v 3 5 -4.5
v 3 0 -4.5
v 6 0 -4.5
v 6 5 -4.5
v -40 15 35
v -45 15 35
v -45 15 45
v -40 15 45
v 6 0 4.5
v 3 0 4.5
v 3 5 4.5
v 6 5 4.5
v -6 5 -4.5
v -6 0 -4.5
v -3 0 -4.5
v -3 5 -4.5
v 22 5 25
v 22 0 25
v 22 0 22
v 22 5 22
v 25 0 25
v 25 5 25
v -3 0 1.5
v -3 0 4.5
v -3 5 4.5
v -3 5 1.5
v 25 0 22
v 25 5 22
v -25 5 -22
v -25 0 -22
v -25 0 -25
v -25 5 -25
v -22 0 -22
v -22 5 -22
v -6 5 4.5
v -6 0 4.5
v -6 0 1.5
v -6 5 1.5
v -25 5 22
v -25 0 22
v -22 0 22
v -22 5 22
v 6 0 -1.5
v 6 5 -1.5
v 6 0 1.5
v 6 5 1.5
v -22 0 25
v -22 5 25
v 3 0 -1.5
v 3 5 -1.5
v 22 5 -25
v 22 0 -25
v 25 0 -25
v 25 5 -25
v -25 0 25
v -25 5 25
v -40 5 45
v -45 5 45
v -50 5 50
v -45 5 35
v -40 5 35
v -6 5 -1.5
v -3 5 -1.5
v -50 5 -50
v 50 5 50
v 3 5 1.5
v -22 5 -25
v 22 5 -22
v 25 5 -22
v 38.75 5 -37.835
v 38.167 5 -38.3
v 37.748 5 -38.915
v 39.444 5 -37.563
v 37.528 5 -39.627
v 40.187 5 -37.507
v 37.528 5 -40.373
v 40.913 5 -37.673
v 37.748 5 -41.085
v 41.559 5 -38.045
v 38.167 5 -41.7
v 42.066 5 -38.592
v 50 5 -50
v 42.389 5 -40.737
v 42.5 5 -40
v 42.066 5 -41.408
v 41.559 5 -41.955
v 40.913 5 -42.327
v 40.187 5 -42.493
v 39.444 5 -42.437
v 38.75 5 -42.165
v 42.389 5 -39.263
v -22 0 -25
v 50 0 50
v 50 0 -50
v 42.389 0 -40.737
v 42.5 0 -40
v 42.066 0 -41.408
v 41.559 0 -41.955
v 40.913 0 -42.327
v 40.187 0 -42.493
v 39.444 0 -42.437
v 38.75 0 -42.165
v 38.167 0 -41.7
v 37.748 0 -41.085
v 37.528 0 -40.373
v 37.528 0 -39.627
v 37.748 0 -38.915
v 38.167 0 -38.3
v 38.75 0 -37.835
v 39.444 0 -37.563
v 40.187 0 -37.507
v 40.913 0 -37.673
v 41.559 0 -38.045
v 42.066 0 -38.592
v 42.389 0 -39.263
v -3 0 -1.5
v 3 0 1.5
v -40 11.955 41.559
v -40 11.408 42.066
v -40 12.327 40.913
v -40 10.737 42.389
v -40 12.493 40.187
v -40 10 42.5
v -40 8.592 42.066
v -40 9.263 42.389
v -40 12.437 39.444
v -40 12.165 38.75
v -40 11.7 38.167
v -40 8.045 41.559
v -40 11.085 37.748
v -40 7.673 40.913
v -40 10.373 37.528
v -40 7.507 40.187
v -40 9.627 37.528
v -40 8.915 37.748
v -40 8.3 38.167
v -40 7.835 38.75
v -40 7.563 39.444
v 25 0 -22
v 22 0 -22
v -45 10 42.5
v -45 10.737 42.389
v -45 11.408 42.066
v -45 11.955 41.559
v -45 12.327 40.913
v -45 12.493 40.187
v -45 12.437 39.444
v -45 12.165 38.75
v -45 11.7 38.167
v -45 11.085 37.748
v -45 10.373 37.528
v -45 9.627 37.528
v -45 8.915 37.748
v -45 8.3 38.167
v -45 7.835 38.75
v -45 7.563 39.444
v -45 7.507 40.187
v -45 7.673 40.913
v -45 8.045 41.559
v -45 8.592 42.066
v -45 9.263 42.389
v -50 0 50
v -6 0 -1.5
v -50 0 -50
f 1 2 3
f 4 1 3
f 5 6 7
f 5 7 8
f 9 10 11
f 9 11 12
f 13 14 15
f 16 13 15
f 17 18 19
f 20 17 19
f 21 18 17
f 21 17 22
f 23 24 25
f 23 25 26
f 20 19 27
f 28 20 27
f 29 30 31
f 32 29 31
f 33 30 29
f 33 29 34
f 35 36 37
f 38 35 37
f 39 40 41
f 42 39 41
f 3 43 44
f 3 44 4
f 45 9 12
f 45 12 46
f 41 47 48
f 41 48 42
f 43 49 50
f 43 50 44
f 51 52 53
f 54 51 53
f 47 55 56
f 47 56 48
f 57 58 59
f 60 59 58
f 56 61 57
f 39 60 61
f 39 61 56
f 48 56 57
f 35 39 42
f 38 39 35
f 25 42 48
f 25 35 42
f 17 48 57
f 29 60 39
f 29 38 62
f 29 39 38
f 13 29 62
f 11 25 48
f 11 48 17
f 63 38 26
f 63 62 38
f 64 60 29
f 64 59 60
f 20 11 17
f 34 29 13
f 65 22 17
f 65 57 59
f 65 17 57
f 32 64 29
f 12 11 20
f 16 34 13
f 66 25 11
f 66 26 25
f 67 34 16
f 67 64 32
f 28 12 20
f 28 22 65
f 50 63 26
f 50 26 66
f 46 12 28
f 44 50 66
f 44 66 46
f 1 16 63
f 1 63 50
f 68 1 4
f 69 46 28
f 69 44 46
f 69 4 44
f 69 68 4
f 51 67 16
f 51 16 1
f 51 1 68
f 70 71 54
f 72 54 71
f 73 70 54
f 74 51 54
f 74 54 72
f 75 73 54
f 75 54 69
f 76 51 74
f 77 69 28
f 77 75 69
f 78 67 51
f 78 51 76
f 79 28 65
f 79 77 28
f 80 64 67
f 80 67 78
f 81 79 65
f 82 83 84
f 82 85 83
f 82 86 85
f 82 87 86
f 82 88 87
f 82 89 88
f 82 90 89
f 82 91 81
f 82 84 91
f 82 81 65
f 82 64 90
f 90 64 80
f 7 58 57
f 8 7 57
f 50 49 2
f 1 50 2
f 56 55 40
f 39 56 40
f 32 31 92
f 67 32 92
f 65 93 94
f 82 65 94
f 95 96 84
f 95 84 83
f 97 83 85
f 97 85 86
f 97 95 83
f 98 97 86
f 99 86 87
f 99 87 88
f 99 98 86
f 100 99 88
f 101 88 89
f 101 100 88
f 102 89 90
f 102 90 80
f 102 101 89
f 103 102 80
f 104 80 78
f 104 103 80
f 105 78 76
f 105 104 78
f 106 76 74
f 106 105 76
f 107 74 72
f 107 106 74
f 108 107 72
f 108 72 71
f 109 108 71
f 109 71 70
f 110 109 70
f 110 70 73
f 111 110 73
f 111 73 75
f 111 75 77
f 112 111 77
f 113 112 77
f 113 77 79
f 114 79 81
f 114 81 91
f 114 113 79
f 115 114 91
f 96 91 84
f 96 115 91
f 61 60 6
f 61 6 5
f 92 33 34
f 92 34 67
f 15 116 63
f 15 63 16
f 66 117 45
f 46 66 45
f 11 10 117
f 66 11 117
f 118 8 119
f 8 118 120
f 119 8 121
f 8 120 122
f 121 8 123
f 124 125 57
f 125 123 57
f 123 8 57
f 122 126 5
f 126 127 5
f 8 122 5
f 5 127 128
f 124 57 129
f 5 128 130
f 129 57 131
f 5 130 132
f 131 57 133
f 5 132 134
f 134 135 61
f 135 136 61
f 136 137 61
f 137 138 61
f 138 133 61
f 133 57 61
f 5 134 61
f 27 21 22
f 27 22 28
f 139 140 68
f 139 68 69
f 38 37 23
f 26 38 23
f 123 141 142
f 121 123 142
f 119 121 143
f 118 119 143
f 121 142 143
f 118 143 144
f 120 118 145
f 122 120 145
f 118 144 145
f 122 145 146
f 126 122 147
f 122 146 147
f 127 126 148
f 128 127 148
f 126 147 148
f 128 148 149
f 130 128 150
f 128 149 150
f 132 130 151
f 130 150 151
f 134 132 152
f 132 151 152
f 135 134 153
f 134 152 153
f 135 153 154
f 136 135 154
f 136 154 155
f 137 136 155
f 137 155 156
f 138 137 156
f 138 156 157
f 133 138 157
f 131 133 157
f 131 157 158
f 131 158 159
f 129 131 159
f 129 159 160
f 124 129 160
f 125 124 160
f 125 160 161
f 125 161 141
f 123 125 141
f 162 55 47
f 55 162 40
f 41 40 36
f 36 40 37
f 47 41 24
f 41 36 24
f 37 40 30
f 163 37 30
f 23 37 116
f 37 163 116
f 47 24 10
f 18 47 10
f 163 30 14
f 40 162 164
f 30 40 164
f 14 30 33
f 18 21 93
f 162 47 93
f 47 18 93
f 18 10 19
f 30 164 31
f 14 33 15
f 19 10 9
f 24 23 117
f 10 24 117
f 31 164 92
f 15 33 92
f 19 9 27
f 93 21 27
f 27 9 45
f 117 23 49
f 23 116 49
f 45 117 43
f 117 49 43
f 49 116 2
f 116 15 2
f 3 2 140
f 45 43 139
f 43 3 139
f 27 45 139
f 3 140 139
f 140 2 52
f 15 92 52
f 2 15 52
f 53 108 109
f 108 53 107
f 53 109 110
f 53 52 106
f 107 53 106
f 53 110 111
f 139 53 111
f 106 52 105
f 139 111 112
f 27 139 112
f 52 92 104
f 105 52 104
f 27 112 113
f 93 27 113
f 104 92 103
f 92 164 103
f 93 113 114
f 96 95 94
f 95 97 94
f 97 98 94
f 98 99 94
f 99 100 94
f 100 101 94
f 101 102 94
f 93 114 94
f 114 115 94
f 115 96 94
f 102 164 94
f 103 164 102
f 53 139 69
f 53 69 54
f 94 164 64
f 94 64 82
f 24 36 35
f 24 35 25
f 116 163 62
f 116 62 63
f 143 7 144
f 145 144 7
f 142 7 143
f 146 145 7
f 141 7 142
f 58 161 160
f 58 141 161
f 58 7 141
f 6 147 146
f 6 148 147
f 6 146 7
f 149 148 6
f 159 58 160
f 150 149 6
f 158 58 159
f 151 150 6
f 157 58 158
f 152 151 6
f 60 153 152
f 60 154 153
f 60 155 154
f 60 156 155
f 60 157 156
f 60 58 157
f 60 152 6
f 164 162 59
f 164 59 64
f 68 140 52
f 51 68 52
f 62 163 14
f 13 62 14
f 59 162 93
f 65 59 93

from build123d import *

# Parameters (mm, degrees)
SKETCH1_W           = 100
SKETCH1_H           = 100
SKETCH1_R           = 2.5
SKETCH1_W_2         = 3
SKETCH1_H_2         = 3
BOSS_EXTRUDE1_DEPTH = 5
SKETCH4_W           = 5
SKETCH4_H           = 10
BOSS_EXTRUDE2_DEPTH = 10
SKETCH5_R           = 2.5
CUT_EXTRUDE1_DEPTH  = 15


with BuildPart() as part:
    # Sketch1 → Boss-Extrude1 (new body)
    with BuildSketch(Plane(origin=(0, 0, 0), x_dir=(1, 0, 0), z_dir=(0, 1, 0))):
        Rectangle(SKETCH1_W, SKETCH1_H)
        with Locations((40, 40)):
            Circle(SKETCH1_R, mode=Mode.SUBTRACT)
        with Locations((-23.5, 23.5)):
            Rectangle(SKETCH1_W_2, SKETCH1_H_2, mode=Mode.SUBTRACT)
        with Locations((23.5, 23.5)):
            Rectangle(SKETCH1_W_2, SKETCH1_H_2, mode=Mode.SUBTRACT)
        with Locations((23.5, -23.5)):
            Rectangle(SKETCH1_W_2, SKETCH1_H_2, mode=Mode.SUBTRACT)
        with Locations((-23.5, -23.5)):
            Rectangle(SKETCH1_W_2, SKETCH1_H_2, mode=Mode.SUBTRACT)
        with Locations((4.5, 3)):
            Rectangle(SKETCH1_W_2, SKETCH1_H_2, mode=Mode.SUBTRACT)
        with Locations((-4.5, 3)):
            Rectangle(SKETCH1_W_2, SKETCH1_H_2, mode=Mode.SUBTRACT)
        with Locations((4.5, -3)):
            Rectangle(SKETCH1_W_2, SKETCH1_H_2, mode=Mode.SUBTRACT)
        with Locations((-4.5, -3)):
            Rectangle(SKETCH1_W_2, SKETCH1_H_2, mode=Mode.SUBTRACT)
    extrude(amount=BOSS_EXTRUDE1_DEPTH)

    # Sketch4 → Boss-Extrude2 (add)
    with BuildSketch(Plane(origin=(0, 5, 0), x_dir=(1, 0, 0), z_dir=(0, 1, 0))):
        with Locations((-42.5, -40)):
            Rectangle(SKETCH4_W, SKETCH4_H)
    extrude(amount=BOSS_EXTRUDE2_DEPTH)

    # Sketch5 → Cut-Extrude1 (cut)
    with BuildSketch(Plane.ZY.offset(45)):
        with Locations((40, 10)):
            Circle(SKETCH5_R)
    extrude(amount=-CUT_EXTRUDE1_DEPTH, mode=Mode.SUBTRACT)


solid = part.part
